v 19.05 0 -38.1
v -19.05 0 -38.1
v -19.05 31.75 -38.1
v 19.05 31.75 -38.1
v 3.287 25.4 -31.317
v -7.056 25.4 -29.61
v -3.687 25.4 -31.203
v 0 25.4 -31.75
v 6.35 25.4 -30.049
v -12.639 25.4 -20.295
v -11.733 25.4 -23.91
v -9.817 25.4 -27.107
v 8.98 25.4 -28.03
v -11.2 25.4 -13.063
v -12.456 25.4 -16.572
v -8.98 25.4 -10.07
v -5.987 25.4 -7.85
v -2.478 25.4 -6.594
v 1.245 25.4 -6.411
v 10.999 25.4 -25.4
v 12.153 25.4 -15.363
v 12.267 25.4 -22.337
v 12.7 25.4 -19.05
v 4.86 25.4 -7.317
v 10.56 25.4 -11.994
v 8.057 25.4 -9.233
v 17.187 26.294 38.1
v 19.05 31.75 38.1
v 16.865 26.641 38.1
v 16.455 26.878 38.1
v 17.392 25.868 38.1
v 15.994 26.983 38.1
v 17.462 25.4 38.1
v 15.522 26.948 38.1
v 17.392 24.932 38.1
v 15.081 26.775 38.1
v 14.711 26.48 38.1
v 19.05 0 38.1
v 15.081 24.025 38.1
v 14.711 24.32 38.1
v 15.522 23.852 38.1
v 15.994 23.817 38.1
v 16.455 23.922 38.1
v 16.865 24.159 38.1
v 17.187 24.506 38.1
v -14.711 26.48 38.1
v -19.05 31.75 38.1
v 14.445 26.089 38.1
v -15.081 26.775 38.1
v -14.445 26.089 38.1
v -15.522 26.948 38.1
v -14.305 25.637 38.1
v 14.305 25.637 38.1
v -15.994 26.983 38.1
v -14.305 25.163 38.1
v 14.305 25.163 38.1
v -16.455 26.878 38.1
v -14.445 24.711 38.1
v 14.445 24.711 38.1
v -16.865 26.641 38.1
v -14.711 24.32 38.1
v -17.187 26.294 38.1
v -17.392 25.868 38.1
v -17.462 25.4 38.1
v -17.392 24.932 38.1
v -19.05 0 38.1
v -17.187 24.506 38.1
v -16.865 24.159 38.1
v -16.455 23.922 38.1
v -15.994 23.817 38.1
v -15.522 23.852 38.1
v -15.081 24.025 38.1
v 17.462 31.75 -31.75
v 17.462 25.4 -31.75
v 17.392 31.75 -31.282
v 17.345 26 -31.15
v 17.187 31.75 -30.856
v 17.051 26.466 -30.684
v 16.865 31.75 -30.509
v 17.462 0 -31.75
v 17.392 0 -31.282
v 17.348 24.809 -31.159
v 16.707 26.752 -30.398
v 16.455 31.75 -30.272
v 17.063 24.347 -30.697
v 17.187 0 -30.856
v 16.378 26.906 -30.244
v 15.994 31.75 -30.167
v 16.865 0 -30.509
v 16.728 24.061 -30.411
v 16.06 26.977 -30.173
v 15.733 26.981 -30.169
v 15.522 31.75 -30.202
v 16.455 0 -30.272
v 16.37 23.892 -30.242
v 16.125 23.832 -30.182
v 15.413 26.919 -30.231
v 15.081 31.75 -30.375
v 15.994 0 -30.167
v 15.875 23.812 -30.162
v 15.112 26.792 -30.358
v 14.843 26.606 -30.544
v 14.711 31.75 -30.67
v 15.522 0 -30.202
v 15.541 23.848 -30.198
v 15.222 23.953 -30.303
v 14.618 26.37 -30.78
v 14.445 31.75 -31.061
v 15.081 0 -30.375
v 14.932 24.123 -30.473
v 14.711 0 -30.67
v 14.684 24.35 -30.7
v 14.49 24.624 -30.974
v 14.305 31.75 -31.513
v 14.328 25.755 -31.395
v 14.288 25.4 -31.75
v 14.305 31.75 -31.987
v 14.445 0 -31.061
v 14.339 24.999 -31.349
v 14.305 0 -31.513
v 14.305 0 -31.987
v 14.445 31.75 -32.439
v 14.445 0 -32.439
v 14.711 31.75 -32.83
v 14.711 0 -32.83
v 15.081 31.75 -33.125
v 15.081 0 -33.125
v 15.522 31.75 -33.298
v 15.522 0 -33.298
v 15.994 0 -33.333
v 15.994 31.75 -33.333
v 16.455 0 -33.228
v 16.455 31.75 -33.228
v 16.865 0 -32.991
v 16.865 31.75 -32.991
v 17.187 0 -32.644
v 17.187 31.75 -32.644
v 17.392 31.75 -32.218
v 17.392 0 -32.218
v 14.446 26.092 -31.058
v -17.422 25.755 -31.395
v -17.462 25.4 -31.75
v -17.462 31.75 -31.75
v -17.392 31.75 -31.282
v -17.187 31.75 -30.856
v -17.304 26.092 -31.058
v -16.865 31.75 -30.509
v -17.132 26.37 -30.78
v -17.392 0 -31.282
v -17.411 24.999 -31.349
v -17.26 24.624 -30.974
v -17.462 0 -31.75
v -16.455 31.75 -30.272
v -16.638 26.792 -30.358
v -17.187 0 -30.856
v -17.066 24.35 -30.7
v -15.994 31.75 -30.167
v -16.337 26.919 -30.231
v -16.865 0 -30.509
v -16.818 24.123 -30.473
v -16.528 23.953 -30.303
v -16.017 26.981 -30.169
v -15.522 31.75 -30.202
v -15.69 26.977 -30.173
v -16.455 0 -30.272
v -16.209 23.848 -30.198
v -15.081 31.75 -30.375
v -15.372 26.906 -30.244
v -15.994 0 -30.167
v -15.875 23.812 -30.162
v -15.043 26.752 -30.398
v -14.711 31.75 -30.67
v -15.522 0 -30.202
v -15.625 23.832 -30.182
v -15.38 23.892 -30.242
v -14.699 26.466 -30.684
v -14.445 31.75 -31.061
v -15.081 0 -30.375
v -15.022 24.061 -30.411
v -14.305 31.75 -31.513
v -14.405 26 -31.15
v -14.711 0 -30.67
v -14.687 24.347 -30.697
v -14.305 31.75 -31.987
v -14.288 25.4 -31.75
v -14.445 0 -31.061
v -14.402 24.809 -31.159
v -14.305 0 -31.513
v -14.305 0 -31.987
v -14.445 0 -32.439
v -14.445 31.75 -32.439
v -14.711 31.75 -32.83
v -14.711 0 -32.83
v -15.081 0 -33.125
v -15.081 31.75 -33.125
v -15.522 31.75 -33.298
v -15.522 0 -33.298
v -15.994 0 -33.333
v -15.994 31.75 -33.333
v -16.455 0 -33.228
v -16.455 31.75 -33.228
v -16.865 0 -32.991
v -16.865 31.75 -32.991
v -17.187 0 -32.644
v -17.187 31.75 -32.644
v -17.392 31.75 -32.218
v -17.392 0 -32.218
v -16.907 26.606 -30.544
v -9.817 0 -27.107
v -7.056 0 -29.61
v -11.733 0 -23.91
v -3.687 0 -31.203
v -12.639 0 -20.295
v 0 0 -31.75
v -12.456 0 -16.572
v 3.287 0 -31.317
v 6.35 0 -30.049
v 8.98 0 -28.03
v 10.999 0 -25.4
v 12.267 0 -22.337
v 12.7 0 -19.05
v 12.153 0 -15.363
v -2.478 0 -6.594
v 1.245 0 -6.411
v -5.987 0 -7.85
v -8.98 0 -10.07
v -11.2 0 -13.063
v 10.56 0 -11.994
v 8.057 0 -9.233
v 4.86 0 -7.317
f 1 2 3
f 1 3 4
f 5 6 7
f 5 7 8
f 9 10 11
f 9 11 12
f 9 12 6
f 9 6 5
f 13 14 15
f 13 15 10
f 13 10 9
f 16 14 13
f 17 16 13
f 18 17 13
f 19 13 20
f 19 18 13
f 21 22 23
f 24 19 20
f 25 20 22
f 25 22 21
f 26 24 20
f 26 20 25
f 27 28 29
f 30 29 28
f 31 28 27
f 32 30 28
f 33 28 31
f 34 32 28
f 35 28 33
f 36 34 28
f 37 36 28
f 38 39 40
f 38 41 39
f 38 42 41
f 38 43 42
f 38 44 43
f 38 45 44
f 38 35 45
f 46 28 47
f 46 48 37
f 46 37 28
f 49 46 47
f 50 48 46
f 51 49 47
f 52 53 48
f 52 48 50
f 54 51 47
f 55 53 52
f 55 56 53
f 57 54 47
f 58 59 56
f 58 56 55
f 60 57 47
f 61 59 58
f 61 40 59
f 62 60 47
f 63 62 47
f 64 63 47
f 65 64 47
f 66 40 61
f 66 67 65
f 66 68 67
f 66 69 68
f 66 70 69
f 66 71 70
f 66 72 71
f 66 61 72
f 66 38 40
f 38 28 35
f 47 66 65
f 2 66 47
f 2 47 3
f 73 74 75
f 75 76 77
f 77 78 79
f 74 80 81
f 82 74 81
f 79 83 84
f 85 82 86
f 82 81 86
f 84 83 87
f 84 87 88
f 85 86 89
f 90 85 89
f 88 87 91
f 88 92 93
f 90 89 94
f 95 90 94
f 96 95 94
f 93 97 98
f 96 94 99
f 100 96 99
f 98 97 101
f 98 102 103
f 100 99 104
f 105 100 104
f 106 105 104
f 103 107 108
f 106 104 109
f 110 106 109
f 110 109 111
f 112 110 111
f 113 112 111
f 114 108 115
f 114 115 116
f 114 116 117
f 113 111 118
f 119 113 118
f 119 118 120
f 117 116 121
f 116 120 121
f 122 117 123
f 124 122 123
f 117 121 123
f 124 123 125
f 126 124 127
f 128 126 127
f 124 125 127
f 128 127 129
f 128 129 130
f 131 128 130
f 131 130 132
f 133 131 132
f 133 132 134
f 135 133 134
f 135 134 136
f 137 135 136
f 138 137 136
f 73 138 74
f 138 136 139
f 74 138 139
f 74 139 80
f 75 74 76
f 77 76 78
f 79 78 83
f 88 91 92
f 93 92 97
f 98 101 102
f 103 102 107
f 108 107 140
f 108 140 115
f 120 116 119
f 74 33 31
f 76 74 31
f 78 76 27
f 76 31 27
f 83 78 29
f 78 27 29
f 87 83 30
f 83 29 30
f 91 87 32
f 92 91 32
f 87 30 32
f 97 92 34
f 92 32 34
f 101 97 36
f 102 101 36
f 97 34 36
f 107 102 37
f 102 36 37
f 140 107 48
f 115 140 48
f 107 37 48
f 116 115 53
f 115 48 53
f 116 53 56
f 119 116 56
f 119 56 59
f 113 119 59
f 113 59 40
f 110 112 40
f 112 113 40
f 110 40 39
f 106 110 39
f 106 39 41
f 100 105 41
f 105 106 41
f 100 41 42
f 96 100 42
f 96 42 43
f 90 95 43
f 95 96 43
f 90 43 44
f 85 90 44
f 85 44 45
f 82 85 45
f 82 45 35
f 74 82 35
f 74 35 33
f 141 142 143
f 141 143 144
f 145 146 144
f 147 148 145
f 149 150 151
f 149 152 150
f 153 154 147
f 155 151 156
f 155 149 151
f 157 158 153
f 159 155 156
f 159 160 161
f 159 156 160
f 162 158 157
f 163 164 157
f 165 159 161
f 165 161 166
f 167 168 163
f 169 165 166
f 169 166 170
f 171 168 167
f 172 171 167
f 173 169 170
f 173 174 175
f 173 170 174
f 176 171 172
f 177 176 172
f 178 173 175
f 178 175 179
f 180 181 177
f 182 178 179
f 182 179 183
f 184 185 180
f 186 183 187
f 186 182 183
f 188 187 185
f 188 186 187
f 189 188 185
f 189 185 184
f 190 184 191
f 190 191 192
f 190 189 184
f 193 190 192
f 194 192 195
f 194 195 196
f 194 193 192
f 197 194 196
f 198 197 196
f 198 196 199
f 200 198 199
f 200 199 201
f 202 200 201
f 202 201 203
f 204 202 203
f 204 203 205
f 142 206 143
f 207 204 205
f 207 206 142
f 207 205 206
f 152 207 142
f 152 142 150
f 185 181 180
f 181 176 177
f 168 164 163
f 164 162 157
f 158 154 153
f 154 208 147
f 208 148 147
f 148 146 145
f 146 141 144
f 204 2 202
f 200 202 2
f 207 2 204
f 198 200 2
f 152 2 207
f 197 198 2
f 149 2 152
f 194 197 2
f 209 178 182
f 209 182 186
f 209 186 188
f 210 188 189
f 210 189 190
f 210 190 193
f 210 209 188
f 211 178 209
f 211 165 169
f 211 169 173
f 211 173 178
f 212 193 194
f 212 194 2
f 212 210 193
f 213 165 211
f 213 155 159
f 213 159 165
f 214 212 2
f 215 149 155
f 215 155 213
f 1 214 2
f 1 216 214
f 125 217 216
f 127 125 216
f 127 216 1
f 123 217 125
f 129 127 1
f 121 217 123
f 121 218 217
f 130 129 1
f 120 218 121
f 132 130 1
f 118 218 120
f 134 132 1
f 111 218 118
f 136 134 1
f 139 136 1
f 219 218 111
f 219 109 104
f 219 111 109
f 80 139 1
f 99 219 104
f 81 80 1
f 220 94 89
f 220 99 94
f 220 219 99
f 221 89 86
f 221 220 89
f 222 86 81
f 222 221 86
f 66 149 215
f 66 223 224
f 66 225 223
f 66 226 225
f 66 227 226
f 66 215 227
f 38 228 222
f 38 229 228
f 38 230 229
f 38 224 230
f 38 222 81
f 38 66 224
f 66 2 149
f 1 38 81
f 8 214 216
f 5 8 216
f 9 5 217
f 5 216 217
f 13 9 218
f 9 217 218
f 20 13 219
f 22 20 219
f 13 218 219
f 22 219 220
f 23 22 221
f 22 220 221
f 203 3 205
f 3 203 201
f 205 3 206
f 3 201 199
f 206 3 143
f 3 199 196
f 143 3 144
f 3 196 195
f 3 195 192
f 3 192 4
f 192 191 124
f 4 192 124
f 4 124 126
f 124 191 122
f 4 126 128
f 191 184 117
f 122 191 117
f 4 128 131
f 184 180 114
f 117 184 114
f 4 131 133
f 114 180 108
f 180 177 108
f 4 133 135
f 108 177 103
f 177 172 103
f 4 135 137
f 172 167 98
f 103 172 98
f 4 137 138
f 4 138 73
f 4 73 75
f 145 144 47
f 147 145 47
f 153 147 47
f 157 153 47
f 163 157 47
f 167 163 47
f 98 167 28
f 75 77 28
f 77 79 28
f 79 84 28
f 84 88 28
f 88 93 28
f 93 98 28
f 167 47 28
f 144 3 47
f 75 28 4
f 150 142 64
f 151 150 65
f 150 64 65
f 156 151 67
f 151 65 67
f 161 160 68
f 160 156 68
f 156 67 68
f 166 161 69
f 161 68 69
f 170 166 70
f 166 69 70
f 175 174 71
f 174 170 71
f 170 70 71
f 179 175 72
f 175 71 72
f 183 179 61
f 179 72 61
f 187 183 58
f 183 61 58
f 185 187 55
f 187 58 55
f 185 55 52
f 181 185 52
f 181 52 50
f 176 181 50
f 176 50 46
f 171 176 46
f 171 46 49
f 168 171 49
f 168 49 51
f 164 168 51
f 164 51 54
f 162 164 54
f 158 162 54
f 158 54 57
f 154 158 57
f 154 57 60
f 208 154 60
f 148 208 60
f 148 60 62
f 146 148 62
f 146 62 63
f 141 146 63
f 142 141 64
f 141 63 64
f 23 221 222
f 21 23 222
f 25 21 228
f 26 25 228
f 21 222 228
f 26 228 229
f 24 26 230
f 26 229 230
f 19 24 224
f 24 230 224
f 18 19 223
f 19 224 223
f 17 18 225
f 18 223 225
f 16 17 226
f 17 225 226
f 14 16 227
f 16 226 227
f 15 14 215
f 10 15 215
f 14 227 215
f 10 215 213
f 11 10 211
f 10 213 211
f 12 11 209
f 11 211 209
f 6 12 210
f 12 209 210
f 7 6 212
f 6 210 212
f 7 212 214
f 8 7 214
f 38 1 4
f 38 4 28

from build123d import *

# Parameters (mm, degrees)
F0_R     = 1.5875
F1_DEPTH = 31.75
F2_DEPTH = 25.4
F3_R     = 1.5875
F3_R_2   = 0.79375
F4_DEPTH = 69.85
F5_DEPTH = 69.85


with BuildPart() as f1:
    # F0 (on Front) → F1 (new body)
    with BuildSketch(Plane.XZ):
        with BuildLine():
            ThreePointArc((-14.2875, -31.75), (-15.875, -30.1625), (-17.4625, -31.75))
            ThreePointArc((-17.4625, -31.75), (-15.875, -33.3375), (-14.2875, -31.75))
        make_face()
        with Locations((15.875, -31.75)):
            Circle(F0_R)
        Polygon((19.05, -31.75), (19.05, 38.1), (-19.05, 38.1), (-19.05, -31.75), (-19.05, -38.1), (0, -38.1), (19.05, -38.1), align=None)
        with BuildLine():
            ThreePointArc((-14.2875, -31.75), (-15.875, -33.3375), (-17.4625, -31.75))
            ThreePointArc((-17.4625, -31.75), (-15.875, -30.1625), (-14.2875, -31.75))
        make_face(mode=Mode.SUBTRACT)
        with Locations((15.875, -31.75)):
            Circle(F0_R, mode=Mode.SUBTRACT)
        with BuildLine():
            ThreePointArc((12.7, -19.05), (8.980256, -28.030256), (0, -31.75))
            ThreePointArc((0, -31.75), (-8.980256, -10.069744), (12.7, -19.05))
        make_face(mode=Mode.SUBTRACT)
        with BuildLine():
            ThreePointArc((12.7, -19.05), (-8.980256, -10.069744), (0, -31.75))
            ThreePointArc((0, -31.75), (8.980256, -28.030256), (12.7, -19.05))
        make_face()
    extrude(amount=-F1_DEPTH)

    # F0 (on Front) → F2 (cut)
    with BuildSketch(Plane.XZ):
        with BuildLine():
            ThreePointArc((12.7, -19.05), (-8.980256, -10.069744), (0, -31.75))
            ThreePointArc((0, -31.75), (8.980256, -28.030256), (12.7, -19.05))
        make_face()
    extrude(amount=-F2_DEPTH, mode=Mode.SUBTRACT)

    # F3 (on face) → F4 (cut)
    with BuildSketch(Plane.XY.offset(38.1)):
        with Locations((15.875, 25.4)):
            Circle(F3_R)
        with Locations((15.875, 25.4)):
            Circle(F3_R_2, mode=Mode.SUBTRACT)
        with Locations((15.875, 25.4)):
            Circle(F3_R_2)
        with BuildLine():
            ThreePointArc((-14.2875, 25.4), (-15.875, 26.9875), (-17.4625, 25.4))
            ThreePointArc((-17.4625, 25.4), (-15.875, 23.8125), (-14.2875, 25.4))
        make_face()
        with BuildLine():
            ThreePointArc((-15.08125, 25.4), (-15.875, 24.60625), (-16.66875, 25.4))
            ThreePointArc((-16.66875, 25.4), (-15.875, 26.19375), (-15.08125, 25.4))
        make_face(mode=Mode.SUBTRACT)
        with BuildLine():
            ThreePointArc((-15.08125, 25.4), (-15.875, 26.19375), (-16.66875, 25.4))
            ThreePointArc((-16.66875, 25.4), (-15.875, 24.60625), (-15.08125, 25.4))
        make_face()
    extrude(amount=-F4_DEPTH, mode=Mode.SUBTRACT)

    # F3 (on face) → F5 (cut)
    with BuildSketch(Plane.XY.offset(38.1)):
        with BuildLine():
            ThreePointArc((-15.08125, 25.4), (-15.875, 26.19375), (-16.66875, 25.4))
            ThreePointArc((-16.66875, 25.4), (-15.875, 24.60625), (-15.08125, 25.4))
        make_face()
        with Locations((15.875, 25.4)):
            Circle(F3_R_2)
    extrude(amount=-F5_DEPTH, mode=Mode.SUBTRACT)


solid = f1.part
